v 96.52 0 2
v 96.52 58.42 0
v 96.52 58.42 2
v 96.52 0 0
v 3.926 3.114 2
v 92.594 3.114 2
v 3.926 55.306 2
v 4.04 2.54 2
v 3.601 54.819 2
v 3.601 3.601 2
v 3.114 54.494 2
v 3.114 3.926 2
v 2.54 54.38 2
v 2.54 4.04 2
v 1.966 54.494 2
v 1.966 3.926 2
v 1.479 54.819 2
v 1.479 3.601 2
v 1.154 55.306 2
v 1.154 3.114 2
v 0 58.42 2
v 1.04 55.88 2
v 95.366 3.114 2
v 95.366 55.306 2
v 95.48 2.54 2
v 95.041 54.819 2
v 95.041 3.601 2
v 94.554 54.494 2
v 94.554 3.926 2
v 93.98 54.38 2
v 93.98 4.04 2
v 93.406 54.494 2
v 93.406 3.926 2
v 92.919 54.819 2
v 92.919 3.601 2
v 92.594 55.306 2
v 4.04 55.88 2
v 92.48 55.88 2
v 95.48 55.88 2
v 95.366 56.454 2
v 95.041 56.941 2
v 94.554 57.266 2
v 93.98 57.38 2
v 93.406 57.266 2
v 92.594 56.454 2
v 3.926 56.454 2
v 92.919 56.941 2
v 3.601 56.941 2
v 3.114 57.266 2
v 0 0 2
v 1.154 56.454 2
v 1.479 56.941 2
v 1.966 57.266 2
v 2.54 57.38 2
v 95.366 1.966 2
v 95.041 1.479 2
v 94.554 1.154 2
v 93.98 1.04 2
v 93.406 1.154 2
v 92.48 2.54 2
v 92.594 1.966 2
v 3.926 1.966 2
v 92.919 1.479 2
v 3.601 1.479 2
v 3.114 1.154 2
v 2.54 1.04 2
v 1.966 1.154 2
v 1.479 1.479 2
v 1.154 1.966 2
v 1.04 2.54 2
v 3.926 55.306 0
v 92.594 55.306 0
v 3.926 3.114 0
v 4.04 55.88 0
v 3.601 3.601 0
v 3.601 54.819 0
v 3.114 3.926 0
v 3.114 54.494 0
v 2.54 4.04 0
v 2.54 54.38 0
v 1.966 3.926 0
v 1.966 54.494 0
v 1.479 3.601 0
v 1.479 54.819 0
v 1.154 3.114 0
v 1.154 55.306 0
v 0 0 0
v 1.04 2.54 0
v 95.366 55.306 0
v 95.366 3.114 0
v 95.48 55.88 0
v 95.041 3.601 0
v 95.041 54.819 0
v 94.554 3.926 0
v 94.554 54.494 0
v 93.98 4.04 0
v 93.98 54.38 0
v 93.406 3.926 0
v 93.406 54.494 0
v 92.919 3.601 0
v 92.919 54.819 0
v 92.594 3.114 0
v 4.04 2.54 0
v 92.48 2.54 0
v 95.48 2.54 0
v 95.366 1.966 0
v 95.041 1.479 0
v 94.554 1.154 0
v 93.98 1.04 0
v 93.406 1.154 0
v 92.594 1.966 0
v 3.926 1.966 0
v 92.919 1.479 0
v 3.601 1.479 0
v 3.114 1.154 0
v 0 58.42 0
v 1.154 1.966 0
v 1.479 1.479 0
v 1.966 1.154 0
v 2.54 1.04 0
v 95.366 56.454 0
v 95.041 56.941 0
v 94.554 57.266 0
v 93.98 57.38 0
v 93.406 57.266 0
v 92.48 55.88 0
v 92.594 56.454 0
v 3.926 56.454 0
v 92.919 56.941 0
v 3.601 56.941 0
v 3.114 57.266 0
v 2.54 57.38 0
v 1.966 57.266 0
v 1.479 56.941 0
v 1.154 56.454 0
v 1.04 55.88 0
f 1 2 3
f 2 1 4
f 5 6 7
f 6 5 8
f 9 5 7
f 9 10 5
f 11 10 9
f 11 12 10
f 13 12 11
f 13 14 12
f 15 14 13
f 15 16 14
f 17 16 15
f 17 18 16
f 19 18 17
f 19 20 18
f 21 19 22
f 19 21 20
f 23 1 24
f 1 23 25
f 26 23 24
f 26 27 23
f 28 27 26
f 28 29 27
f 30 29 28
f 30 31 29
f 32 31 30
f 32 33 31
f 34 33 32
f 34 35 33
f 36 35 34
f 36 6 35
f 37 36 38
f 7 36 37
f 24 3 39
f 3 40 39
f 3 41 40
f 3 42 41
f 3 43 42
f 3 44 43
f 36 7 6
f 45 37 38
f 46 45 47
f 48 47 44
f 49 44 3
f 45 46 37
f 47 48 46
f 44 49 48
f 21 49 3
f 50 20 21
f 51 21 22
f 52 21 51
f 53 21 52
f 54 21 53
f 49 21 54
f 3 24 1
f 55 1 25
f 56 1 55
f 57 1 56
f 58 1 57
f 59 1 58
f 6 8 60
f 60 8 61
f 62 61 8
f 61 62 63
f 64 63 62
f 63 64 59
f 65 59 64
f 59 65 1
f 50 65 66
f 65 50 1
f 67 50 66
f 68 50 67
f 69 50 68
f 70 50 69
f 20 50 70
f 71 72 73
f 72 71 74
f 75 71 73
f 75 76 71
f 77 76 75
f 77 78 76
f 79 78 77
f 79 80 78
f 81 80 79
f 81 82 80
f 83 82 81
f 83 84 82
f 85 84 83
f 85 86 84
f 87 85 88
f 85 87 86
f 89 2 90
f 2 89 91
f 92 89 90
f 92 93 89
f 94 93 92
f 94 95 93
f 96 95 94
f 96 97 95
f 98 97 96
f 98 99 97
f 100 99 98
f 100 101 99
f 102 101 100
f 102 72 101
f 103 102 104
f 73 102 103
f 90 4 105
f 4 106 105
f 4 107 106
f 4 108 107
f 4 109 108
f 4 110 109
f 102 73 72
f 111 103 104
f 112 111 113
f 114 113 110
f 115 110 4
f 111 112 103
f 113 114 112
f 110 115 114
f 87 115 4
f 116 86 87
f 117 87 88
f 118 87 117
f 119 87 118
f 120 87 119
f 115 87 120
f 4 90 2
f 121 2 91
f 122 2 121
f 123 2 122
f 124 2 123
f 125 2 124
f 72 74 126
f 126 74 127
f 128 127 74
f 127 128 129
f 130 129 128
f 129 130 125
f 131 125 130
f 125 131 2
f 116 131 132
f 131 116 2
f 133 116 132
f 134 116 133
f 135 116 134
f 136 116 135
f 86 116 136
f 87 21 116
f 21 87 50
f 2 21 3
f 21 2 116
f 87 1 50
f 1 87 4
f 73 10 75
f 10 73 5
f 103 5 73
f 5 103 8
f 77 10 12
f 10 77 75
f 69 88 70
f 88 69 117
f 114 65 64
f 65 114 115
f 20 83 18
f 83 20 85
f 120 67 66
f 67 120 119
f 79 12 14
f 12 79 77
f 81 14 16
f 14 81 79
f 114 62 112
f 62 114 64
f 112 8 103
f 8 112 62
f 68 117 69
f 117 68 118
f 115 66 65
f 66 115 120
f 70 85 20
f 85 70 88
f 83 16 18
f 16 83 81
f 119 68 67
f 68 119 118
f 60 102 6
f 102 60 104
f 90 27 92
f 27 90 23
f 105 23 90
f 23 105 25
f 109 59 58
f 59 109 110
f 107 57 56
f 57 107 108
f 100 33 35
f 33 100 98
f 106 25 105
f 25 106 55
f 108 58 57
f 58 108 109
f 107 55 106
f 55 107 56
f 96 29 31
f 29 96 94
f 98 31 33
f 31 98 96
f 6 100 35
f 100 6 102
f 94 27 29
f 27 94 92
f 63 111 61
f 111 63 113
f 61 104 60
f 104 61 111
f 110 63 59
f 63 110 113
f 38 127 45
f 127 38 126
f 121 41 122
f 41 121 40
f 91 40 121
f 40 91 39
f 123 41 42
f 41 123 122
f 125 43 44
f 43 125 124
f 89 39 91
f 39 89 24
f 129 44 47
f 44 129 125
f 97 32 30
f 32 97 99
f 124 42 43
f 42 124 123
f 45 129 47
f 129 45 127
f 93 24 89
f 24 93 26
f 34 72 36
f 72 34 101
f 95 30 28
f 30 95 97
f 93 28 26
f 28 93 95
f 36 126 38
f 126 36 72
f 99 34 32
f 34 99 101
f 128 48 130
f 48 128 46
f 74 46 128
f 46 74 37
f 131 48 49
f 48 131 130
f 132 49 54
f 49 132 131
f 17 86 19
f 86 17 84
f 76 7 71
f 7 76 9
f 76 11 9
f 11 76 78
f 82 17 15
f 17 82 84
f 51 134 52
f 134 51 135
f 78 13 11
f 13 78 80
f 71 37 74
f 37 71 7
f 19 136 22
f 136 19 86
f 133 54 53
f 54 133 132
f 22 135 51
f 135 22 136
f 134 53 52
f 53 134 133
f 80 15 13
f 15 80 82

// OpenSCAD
CW = 85.0;//mm card width   < 34 x 2.54
CH = 54.0;//mm card height  < 22 x 2.54 
CT =  0.9;//mm card thickness

W = 38 * 2.54;// width
H = 23 * 2.54;// height
T =  1 * 2.00;// thickness

color("DeepSkyBlue",0.5)difference() {
    cube([W,H,T]);
    // PCB HOLES
    *for(X = [0 : 2.54 : W+1]){
        for(Y = [0 : 2.54 : H+1]){
            translate([X,Y,-1])cylinder(T+2,0.5,0.5);
        }
    }
    // DRILL HOLES
    translate([  2.54,  2.54,-1])cylinder(T+2,1.5,1.5,$fn=16);
    translate([W-2.54,  2.54,-1])cylinder(T+2,1.5,1.5,$fn=16);
    translate([W-2.54,H-2.54,-1])cylinder(T+2,1.5,1.5,$fn=16);
    translate([  2.54,H-2.54,-1])cylinder(T+2,1.5,1.5,$fn=16);
}
